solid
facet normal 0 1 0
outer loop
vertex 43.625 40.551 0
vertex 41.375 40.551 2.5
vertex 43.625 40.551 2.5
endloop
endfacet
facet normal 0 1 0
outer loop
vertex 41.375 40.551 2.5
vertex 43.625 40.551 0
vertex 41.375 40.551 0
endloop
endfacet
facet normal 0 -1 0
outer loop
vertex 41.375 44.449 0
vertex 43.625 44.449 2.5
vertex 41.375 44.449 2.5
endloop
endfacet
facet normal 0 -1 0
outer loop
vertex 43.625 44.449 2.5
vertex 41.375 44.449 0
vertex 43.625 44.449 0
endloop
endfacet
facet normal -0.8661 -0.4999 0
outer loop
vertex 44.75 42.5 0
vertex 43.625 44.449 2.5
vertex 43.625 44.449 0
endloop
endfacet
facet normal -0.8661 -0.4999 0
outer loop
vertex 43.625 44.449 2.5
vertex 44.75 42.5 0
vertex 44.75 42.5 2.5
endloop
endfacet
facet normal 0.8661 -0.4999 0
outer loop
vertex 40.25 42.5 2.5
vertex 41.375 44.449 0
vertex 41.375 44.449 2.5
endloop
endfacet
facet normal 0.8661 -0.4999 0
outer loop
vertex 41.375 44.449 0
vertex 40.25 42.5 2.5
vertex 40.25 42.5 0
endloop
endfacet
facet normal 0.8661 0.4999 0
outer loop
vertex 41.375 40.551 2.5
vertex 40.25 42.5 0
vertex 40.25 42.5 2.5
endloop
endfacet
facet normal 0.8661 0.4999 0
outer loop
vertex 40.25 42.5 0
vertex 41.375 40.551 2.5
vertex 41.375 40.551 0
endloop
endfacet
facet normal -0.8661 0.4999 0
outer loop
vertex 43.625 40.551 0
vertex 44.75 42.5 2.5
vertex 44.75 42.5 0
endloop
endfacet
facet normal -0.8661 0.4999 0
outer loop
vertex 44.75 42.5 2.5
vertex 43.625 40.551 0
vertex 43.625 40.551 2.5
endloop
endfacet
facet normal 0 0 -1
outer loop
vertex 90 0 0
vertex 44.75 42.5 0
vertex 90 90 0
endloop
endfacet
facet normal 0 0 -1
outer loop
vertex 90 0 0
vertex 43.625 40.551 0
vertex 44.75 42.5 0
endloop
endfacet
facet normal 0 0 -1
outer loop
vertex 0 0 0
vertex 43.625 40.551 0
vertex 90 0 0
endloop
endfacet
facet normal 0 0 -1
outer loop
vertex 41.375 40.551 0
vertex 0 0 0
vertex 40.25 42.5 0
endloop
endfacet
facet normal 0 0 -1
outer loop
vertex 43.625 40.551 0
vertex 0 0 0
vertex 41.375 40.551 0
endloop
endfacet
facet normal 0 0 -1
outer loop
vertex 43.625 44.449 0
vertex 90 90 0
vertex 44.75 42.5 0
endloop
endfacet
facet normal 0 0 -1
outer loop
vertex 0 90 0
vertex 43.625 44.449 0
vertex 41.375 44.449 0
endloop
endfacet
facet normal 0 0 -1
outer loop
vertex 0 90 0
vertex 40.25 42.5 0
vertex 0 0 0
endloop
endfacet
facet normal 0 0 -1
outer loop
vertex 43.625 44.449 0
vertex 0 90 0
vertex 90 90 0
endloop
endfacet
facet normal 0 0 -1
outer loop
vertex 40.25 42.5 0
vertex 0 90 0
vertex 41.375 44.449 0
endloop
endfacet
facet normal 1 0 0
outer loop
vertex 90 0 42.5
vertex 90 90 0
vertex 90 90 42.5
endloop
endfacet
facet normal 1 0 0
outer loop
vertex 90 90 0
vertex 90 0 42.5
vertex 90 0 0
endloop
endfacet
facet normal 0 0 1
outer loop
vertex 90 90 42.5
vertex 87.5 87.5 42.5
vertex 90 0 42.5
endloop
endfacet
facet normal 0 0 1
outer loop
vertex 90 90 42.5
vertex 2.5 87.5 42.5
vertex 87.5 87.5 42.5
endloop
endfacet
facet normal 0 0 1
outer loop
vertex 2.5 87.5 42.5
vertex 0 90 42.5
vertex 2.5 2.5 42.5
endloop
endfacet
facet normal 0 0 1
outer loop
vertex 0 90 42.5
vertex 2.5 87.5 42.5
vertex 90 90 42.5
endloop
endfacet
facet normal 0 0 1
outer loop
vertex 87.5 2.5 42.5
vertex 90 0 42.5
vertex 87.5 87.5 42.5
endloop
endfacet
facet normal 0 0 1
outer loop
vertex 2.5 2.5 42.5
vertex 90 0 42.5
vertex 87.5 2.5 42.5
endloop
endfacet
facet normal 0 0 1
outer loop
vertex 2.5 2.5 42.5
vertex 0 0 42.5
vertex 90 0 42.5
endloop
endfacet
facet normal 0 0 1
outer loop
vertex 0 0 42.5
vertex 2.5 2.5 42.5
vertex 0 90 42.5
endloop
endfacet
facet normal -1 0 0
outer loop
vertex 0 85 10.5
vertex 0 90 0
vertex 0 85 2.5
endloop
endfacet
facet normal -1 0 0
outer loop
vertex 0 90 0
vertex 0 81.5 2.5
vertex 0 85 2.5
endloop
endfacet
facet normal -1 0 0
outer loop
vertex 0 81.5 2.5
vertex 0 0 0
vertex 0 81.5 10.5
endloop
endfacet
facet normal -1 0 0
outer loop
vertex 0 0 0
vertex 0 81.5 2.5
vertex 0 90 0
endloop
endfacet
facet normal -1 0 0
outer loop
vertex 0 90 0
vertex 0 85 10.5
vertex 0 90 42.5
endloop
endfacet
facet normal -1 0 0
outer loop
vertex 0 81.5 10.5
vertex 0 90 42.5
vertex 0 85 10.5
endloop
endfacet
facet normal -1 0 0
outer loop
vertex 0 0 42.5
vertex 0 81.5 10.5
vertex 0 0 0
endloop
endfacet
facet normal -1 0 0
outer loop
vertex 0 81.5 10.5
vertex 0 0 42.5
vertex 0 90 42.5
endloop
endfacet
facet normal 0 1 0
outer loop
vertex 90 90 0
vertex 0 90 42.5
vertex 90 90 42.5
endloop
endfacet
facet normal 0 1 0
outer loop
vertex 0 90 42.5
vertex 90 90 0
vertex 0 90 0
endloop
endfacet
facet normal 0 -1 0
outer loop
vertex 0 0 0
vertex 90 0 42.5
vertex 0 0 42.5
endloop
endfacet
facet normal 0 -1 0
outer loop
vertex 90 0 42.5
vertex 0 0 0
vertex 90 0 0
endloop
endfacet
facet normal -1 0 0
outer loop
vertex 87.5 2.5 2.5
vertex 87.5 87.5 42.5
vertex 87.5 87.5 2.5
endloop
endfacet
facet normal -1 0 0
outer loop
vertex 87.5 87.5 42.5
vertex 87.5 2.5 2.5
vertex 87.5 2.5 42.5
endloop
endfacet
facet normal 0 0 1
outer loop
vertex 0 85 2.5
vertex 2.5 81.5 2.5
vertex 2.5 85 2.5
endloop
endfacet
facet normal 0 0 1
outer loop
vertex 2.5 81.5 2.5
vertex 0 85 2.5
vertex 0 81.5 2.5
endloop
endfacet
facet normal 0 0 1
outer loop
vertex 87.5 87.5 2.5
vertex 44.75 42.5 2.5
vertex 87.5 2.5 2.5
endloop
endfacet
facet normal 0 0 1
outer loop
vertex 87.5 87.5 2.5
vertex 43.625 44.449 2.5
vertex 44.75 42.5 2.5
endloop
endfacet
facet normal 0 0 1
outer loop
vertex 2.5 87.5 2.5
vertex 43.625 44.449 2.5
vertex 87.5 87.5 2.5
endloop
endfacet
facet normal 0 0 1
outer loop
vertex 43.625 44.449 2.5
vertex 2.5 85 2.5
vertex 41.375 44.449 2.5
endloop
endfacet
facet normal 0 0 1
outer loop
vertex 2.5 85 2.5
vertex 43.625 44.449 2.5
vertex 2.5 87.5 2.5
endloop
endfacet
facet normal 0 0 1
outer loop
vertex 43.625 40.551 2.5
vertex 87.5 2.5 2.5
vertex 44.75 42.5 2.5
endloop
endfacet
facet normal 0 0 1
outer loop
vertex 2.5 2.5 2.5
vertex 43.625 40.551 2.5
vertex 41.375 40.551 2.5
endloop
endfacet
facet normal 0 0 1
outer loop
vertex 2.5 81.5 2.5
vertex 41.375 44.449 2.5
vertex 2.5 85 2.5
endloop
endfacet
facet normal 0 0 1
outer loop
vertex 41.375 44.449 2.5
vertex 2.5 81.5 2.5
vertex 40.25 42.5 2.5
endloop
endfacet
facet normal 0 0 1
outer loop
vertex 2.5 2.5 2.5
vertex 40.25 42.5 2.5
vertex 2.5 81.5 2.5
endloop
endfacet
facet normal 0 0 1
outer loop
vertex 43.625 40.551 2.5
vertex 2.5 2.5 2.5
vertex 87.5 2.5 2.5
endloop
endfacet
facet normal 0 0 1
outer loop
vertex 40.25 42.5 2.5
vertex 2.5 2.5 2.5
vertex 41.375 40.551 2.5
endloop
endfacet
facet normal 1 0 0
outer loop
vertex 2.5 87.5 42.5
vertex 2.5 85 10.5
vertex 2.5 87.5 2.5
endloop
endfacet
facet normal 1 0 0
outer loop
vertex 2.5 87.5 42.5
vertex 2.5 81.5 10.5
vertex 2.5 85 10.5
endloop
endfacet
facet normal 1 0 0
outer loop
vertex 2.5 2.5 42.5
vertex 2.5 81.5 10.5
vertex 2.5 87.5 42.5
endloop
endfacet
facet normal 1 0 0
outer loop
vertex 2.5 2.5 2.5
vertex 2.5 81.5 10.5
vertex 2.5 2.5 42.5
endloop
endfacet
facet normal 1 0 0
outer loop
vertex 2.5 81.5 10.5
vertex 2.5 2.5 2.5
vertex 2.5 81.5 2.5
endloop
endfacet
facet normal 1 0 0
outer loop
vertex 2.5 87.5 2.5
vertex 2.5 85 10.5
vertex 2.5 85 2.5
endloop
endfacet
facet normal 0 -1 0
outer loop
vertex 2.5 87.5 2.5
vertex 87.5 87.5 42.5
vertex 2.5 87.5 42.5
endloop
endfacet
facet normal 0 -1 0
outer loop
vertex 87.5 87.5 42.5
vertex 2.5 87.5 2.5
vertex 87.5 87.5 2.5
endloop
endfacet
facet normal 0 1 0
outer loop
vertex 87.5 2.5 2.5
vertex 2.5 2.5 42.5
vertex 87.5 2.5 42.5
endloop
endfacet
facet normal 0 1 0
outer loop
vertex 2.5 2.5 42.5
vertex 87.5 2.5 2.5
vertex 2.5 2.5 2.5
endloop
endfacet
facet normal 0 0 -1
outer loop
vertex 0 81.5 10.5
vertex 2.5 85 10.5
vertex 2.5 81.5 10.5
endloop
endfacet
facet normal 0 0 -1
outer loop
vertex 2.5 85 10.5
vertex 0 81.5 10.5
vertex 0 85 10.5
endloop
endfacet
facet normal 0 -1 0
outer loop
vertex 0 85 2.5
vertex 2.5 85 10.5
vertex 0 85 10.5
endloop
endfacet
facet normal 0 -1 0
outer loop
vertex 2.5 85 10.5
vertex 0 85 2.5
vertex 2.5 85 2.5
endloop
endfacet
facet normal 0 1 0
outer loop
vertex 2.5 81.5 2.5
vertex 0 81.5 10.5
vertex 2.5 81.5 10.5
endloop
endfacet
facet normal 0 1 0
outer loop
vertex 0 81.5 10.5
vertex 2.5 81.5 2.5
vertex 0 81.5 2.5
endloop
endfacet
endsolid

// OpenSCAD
// Fan box - an open box (top open) housing for a round PC case fan, e.g. an 80 mm fan. NOVEL part.
//

top    = 90;
height = 40;
wall   = 2.5;
screw  = 4.5;

$fn = 6;

inner = top - 2 * wall;

difference() {
    cube([top, top, height + wall]);                 // outer block, floor included
    translate([wall, wall, wall]) cube([inner, inner, height]);   // hollow: open top at z = height + wall
    for (sx = [-1, 1]) for (sy = [-1, 1])
        translate([sx * 0.5 * (top - 2 * wall), sy * 0.5 * (top - 2 * wall), 0])
            cylinder(h = height + 1, d = screw);                 // screw holes through the floor
    // one cable notch in a wall: 12 mm wide, centred along the wall, 8 mm deep from the open edge
    translate([0, top - wall - 6, wall]) cube([12, wall + 1, 8]);
}
